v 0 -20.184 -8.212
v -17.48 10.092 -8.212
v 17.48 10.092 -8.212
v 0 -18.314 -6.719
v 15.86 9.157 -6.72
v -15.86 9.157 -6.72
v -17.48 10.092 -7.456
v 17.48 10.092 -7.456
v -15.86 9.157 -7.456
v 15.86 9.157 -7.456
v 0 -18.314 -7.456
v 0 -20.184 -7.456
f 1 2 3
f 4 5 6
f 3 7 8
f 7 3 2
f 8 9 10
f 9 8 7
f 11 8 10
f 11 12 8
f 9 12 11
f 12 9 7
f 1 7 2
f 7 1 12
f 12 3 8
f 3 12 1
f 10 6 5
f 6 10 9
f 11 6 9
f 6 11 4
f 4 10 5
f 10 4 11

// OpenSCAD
arete = 40.433;
paroi = 1.5;
echelleReductionAjustementBouchon = 0.96;
r = 0.19; // résolution d'impression sur l'axe Z
tetra_sch = [3,3];
Cpi = 3.14159;
Cphi = (1+sqrt(5))/2;
Cepsilon = 0.00000001;

function tetra_ext_radius(a) = 
    a/4*sqrt(6);
    
function tetra_int_radius(a) = 
    a/12*sqrt(6);
    
function tetra_arete_from(radius) = 
    radius*12/sqrt(6);
    
externalRadius = tetra_ext_radius(arete);
internalRadius = tetra_ext_radius( 
                    tetra_arete_from(
                        tetra_int_radius(arete)-paroi));
                        
echo(externalRadius); 
echo(internalRadius);

//tetrahedron(arete);
//tetra_creux();
//decoupe_bouchon();
//corps_ouvert();
bouchon();
//trou();

module corps_ouvert() {
	difference() {
		tetra_creux();
		decoupe_bouchon();
	}
}

module bouchon() {
//    rotate([180, 0, 0])
	scale([echelleReductionAjustementBouchon, echelleReductionAjustementBouchon, 0.995])
	difference () {
        intersection() {
            tetra_creux();
            decoupe_bouchon(echelleReductionAjustementBouchon);
        }
	}
}

module tetra_creux() {
	difference() {
        tetrahedron(externalRadius);
        tetrahedron(internalRadius);
	}
}

module decoupe_bouchon(scale=1) {
    distance = tetra_int_radius(arete);
	rotate([0,0,30]) translate([0,0,-distance-2*r])
		cylinder(6*r, r=arete*0.52, $fn=3);
	rotate([0,0,30]) translate([0,0,-distance])
		cylinder(8*r, r=(arete-paroi)*0.49, $fn=3);
}


module tetrahedron(rad) {
    // create an instance of a spherical coordinate
    // long - rotation around z -axis
    // lat - latitude, starting at 0 == 'north pole'
    // rad - distance from center
    function sph(long, lat, rad=1) = [long, lat, rad];
    
    // Convert spherical to cartesian
    function sph_to_cart(s) = [
	clean(s[2]*sin(s[1])*cos(s[0])),  

	clean(s[2]*sin(s[1])*sin(s[0])),

	clean(s[2]*cos(s[1]))
	];

    function sphu_from_cart(c, rad=1) = sph(
        atan2(c[1],c[0]), 
        atan2(sqrt(c[0]*c[0]+c[1]*c[1]), c[2]), 
        rad
        );

    tetra_cart = [
        [+1, +1, +1],
        [-1, -1, +1],
        [-1, +1, -1],
        [+1, -1, -1]
    ];

    function tetra_unit(rad=1) = [
        sph_to_cart(sphu_from_cart(tetra_cart[0], rad)), 
        sph_to_cart(sphu_from_cart(tetra_cart[1], rad)),
        sph_to_cart(sphu_from_cart(tetra_cart[2], rad)),
        sph_to_cart(sphu_from_cart(tetra_cart[3], rad)),
        ];


    tetrafaces = [
        [0, 3, 1],
        [0,1,2],
        [2,1,3],
        [0,2,3]
    ];

    tetra_edges = [
        [0,1],
        [0,2],
        [0,3], 
        [1,2], 
        [1,3], 
        [2,3],	
        ];

    rotate([54.735, 0, 0])
    rotate([0, 0, 45])
    polyhedron(tetra_unit(rad), faces=tetrafaces);
}
//translate([0, 0, -17.7])
//cylinder(5,40,40);

function clean(n) = (n < 0) ? ((n < -Cepsilon) ? n : 0) : 
	(n < Cepsilon) ? 0 : n; 

function plat_dihedral(pq) = 2 * asin( cos(180/pq[1])/sin(180/pq[0]));

function plat_circumradius(pq, a) = 
	(a/2)*
	tan(Cpi/pq[1])*
	tan(plat_dihedral(pq)/2);

function plat_midradius(pq, a) = 
	(a/2)*
	cos(Cpi/pq[0])*
	tan(plat_dihedral(pq)/2);

function plat_inradius(pq,a) = 
	a/(2*tan(Cpi/pq[0]))*
	sqrt((1-cos(plat_dihedral(pq)))/(1+cos(plat_dihedral(pq))));

function plat_a_from_inradius(pq, inradius) =
    inradius*(2*tan(Cpi/pq[0]))/
	sqrt((1-cos(plat_dihedral(pq)))/(1+cos(plat_dihedral(pq))));
